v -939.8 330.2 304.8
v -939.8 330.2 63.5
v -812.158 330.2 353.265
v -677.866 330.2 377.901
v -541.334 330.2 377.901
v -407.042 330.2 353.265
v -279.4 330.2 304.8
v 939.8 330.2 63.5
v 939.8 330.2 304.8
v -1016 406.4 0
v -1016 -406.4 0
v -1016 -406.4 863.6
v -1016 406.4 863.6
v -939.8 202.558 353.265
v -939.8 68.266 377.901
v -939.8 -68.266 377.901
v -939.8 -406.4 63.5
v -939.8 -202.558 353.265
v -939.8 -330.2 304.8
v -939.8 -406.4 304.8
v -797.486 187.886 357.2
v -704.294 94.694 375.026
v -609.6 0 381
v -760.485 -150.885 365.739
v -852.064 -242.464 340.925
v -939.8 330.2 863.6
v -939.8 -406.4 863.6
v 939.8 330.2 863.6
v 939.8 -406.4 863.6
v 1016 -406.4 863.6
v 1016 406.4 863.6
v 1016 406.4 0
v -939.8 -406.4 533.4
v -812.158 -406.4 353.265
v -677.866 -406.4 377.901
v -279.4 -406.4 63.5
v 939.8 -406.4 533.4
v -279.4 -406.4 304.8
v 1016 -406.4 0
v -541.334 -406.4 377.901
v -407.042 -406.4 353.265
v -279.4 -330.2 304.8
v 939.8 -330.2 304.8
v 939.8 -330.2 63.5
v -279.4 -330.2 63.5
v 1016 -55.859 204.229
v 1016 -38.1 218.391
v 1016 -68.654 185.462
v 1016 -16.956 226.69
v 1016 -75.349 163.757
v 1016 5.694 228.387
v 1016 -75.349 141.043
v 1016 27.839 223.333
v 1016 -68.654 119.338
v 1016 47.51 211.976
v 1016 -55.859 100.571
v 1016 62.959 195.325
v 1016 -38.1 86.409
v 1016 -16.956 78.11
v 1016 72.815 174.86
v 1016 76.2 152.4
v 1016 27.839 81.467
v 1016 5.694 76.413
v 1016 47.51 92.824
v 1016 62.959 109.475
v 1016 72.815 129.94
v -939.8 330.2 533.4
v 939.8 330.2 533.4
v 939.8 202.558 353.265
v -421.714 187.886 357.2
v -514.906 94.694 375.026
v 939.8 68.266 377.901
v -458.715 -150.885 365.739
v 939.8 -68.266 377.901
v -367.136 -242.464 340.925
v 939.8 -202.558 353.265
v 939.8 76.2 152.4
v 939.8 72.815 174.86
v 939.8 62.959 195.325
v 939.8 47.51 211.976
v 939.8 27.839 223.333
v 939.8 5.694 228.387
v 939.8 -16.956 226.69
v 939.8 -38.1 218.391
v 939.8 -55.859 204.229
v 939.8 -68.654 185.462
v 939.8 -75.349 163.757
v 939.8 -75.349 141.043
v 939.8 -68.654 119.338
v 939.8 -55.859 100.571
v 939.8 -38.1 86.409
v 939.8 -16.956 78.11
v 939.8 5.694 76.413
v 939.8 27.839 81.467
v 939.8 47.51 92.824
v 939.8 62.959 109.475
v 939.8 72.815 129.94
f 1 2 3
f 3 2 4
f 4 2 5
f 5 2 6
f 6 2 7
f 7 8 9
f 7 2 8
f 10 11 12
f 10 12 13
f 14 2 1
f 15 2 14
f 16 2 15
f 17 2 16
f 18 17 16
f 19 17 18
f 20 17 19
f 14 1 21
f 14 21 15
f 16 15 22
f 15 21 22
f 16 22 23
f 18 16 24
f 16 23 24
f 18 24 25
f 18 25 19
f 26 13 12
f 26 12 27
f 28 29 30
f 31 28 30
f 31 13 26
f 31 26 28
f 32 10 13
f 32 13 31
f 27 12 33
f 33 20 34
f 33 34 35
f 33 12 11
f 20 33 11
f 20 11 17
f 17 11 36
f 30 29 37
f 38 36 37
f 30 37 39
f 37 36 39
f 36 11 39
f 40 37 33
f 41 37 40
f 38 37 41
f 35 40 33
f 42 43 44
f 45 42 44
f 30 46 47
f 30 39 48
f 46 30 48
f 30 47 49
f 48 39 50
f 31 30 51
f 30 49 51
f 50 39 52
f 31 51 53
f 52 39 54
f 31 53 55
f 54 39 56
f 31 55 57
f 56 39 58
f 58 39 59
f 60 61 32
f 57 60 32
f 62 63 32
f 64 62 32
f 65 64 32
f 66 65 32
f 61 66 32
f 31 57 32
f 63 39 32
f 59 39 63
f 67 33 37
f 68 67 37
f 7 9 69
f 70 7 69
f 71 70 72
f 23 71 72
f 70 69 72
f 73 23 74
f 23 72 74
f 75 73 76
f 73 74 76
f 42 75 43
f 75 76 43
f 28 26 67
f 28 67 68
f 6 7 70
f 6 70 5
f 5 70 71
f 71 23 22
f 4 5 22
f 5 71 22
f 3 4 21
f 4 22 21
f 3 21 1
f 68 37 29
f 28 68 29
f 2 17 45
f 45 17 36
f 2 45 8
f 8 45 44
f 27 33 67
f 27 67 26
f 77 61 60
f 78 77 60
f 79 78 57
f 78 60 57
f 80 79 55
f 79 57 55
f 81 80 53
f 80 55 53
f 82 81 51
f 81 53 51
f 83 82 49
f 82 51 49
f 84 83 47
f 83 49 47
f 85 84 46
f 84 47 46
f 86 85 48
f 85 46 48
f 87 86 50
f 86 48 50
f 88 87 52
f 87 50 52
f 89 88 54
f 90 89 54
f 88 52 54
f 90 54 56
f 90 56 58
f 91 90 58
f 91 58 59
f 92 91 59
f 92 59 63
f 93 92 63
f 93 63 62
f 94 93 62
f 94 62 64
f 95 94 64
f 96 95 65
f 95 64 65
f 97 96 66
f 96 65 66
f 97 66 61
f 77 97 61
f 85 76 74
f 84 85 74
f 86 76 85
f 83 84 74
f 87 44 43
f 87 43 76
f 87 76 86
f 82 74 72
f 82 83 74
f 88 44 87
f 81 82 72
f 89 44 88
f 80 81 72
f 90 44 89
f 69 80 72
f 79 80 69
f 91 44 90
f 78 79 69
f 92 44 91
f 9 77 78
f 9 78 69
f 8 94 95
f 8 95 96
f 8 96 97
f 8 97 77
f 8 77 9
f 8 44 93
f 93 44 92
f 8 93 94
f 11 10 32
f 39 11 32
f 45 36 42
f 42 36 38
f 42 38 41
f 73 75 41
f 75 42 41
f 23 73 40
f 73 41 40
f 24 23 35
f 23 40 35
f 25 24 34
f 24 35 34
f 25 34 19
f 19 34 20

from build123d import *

# Parameters (mm, degrees)
F0_W      = 2032
F0_H      = 812.8
F1_DEPTH  = 914.4
F4_DEPTH  = 1955.8
F3_W      = 1879.6
F3_H      = 330.2
F5_DEPTH  = 736.6
F6_W      = 660.4
F6_H      = 241.3
F7_DEPTH  = 736.6
F8_W      = 76.2
F8_H      = 660.4
F10_R     = 76.2
F11_DEPTH = 76.2
F12_DEPTH = 50.8


with BuildPart() as f1:
    # F0 (on Top) → F1 (new body)
    with BuildSketch(Plane.XY):
        Rectangle(F0_W, F0_H)
    extrude(amount=F1_DEPTH)

    # F2 (on face) → F4 (cut)
    with BuildSketch(Plane.YZ.offset(1016)):
        with BuildLine():
            Line((330.2, 63.5), (330.2, 304.8))
            ThreePointArc((330.2, 304.8), (0, 381), (-330.2, 304.8))
            Line((-330.2, 304.8), (-330.2, 63.5))
            Line((-330.2, 63.5), (330.2, 63.5))
        make_face()
    extrude(amount=-F4_DEPTH, mode=Mode.SUBTRACT)

    # F3 (on face) → F5 (cut)
    with BuildSketch(Plane.XZ.offset(406.4)):
        with Locations((0, 698.5)):
            Rectangle(F3_W, F3_H)
    extrude(amount=-F5_DEPTH, mode=Mode.SUBTRACT)

    # F6 (on face) → F7 (cut)
    with BuildSketch(Plane.XZ.offset(406.4)):
        with Locations((-609.6, 184.15)):
            Rectangle(F6_W, F6_H)
        with BuildLine():
            ThreePointArc((-279.4, 304.8), (-609.6, 381), (-939.8, 304.8))
            Line((-939.8, 304.8), (-279.4, 304.8))
        make_face()
    extrude(amount=-F7_DEPTH, mode=Mode.SUBTRACT)

    # F8 (on face) → F9 (join, up to the next surface of F1)
    with BuildSketch(Plane.XY.offset(63.5)):
        with Locations((977.9, 0)):
            Rectangle(F8_W, F8_H)
    extrude(until=Until.NEXT)

    # F10 (on face) → F11 (cut, through all)
    with BuildSketch(Plane.YZ.offset(1016)):
        with Locations((0, 152.4)):
            Circle(F10_R)
    extrude(amount=-F11_DEPTH, mode=Mode.SUBTRACT)

    # F12 (cut): a face of the model
    f12_faces = [f1.faces().sort_by_distance(p)[0] for p in [
        (0, 0, 914.4),
    ]]
    extrude(f12_faces, amount=-F12_DEPTH, mode=Mode.SUBTRACT)


solid = f1.part
